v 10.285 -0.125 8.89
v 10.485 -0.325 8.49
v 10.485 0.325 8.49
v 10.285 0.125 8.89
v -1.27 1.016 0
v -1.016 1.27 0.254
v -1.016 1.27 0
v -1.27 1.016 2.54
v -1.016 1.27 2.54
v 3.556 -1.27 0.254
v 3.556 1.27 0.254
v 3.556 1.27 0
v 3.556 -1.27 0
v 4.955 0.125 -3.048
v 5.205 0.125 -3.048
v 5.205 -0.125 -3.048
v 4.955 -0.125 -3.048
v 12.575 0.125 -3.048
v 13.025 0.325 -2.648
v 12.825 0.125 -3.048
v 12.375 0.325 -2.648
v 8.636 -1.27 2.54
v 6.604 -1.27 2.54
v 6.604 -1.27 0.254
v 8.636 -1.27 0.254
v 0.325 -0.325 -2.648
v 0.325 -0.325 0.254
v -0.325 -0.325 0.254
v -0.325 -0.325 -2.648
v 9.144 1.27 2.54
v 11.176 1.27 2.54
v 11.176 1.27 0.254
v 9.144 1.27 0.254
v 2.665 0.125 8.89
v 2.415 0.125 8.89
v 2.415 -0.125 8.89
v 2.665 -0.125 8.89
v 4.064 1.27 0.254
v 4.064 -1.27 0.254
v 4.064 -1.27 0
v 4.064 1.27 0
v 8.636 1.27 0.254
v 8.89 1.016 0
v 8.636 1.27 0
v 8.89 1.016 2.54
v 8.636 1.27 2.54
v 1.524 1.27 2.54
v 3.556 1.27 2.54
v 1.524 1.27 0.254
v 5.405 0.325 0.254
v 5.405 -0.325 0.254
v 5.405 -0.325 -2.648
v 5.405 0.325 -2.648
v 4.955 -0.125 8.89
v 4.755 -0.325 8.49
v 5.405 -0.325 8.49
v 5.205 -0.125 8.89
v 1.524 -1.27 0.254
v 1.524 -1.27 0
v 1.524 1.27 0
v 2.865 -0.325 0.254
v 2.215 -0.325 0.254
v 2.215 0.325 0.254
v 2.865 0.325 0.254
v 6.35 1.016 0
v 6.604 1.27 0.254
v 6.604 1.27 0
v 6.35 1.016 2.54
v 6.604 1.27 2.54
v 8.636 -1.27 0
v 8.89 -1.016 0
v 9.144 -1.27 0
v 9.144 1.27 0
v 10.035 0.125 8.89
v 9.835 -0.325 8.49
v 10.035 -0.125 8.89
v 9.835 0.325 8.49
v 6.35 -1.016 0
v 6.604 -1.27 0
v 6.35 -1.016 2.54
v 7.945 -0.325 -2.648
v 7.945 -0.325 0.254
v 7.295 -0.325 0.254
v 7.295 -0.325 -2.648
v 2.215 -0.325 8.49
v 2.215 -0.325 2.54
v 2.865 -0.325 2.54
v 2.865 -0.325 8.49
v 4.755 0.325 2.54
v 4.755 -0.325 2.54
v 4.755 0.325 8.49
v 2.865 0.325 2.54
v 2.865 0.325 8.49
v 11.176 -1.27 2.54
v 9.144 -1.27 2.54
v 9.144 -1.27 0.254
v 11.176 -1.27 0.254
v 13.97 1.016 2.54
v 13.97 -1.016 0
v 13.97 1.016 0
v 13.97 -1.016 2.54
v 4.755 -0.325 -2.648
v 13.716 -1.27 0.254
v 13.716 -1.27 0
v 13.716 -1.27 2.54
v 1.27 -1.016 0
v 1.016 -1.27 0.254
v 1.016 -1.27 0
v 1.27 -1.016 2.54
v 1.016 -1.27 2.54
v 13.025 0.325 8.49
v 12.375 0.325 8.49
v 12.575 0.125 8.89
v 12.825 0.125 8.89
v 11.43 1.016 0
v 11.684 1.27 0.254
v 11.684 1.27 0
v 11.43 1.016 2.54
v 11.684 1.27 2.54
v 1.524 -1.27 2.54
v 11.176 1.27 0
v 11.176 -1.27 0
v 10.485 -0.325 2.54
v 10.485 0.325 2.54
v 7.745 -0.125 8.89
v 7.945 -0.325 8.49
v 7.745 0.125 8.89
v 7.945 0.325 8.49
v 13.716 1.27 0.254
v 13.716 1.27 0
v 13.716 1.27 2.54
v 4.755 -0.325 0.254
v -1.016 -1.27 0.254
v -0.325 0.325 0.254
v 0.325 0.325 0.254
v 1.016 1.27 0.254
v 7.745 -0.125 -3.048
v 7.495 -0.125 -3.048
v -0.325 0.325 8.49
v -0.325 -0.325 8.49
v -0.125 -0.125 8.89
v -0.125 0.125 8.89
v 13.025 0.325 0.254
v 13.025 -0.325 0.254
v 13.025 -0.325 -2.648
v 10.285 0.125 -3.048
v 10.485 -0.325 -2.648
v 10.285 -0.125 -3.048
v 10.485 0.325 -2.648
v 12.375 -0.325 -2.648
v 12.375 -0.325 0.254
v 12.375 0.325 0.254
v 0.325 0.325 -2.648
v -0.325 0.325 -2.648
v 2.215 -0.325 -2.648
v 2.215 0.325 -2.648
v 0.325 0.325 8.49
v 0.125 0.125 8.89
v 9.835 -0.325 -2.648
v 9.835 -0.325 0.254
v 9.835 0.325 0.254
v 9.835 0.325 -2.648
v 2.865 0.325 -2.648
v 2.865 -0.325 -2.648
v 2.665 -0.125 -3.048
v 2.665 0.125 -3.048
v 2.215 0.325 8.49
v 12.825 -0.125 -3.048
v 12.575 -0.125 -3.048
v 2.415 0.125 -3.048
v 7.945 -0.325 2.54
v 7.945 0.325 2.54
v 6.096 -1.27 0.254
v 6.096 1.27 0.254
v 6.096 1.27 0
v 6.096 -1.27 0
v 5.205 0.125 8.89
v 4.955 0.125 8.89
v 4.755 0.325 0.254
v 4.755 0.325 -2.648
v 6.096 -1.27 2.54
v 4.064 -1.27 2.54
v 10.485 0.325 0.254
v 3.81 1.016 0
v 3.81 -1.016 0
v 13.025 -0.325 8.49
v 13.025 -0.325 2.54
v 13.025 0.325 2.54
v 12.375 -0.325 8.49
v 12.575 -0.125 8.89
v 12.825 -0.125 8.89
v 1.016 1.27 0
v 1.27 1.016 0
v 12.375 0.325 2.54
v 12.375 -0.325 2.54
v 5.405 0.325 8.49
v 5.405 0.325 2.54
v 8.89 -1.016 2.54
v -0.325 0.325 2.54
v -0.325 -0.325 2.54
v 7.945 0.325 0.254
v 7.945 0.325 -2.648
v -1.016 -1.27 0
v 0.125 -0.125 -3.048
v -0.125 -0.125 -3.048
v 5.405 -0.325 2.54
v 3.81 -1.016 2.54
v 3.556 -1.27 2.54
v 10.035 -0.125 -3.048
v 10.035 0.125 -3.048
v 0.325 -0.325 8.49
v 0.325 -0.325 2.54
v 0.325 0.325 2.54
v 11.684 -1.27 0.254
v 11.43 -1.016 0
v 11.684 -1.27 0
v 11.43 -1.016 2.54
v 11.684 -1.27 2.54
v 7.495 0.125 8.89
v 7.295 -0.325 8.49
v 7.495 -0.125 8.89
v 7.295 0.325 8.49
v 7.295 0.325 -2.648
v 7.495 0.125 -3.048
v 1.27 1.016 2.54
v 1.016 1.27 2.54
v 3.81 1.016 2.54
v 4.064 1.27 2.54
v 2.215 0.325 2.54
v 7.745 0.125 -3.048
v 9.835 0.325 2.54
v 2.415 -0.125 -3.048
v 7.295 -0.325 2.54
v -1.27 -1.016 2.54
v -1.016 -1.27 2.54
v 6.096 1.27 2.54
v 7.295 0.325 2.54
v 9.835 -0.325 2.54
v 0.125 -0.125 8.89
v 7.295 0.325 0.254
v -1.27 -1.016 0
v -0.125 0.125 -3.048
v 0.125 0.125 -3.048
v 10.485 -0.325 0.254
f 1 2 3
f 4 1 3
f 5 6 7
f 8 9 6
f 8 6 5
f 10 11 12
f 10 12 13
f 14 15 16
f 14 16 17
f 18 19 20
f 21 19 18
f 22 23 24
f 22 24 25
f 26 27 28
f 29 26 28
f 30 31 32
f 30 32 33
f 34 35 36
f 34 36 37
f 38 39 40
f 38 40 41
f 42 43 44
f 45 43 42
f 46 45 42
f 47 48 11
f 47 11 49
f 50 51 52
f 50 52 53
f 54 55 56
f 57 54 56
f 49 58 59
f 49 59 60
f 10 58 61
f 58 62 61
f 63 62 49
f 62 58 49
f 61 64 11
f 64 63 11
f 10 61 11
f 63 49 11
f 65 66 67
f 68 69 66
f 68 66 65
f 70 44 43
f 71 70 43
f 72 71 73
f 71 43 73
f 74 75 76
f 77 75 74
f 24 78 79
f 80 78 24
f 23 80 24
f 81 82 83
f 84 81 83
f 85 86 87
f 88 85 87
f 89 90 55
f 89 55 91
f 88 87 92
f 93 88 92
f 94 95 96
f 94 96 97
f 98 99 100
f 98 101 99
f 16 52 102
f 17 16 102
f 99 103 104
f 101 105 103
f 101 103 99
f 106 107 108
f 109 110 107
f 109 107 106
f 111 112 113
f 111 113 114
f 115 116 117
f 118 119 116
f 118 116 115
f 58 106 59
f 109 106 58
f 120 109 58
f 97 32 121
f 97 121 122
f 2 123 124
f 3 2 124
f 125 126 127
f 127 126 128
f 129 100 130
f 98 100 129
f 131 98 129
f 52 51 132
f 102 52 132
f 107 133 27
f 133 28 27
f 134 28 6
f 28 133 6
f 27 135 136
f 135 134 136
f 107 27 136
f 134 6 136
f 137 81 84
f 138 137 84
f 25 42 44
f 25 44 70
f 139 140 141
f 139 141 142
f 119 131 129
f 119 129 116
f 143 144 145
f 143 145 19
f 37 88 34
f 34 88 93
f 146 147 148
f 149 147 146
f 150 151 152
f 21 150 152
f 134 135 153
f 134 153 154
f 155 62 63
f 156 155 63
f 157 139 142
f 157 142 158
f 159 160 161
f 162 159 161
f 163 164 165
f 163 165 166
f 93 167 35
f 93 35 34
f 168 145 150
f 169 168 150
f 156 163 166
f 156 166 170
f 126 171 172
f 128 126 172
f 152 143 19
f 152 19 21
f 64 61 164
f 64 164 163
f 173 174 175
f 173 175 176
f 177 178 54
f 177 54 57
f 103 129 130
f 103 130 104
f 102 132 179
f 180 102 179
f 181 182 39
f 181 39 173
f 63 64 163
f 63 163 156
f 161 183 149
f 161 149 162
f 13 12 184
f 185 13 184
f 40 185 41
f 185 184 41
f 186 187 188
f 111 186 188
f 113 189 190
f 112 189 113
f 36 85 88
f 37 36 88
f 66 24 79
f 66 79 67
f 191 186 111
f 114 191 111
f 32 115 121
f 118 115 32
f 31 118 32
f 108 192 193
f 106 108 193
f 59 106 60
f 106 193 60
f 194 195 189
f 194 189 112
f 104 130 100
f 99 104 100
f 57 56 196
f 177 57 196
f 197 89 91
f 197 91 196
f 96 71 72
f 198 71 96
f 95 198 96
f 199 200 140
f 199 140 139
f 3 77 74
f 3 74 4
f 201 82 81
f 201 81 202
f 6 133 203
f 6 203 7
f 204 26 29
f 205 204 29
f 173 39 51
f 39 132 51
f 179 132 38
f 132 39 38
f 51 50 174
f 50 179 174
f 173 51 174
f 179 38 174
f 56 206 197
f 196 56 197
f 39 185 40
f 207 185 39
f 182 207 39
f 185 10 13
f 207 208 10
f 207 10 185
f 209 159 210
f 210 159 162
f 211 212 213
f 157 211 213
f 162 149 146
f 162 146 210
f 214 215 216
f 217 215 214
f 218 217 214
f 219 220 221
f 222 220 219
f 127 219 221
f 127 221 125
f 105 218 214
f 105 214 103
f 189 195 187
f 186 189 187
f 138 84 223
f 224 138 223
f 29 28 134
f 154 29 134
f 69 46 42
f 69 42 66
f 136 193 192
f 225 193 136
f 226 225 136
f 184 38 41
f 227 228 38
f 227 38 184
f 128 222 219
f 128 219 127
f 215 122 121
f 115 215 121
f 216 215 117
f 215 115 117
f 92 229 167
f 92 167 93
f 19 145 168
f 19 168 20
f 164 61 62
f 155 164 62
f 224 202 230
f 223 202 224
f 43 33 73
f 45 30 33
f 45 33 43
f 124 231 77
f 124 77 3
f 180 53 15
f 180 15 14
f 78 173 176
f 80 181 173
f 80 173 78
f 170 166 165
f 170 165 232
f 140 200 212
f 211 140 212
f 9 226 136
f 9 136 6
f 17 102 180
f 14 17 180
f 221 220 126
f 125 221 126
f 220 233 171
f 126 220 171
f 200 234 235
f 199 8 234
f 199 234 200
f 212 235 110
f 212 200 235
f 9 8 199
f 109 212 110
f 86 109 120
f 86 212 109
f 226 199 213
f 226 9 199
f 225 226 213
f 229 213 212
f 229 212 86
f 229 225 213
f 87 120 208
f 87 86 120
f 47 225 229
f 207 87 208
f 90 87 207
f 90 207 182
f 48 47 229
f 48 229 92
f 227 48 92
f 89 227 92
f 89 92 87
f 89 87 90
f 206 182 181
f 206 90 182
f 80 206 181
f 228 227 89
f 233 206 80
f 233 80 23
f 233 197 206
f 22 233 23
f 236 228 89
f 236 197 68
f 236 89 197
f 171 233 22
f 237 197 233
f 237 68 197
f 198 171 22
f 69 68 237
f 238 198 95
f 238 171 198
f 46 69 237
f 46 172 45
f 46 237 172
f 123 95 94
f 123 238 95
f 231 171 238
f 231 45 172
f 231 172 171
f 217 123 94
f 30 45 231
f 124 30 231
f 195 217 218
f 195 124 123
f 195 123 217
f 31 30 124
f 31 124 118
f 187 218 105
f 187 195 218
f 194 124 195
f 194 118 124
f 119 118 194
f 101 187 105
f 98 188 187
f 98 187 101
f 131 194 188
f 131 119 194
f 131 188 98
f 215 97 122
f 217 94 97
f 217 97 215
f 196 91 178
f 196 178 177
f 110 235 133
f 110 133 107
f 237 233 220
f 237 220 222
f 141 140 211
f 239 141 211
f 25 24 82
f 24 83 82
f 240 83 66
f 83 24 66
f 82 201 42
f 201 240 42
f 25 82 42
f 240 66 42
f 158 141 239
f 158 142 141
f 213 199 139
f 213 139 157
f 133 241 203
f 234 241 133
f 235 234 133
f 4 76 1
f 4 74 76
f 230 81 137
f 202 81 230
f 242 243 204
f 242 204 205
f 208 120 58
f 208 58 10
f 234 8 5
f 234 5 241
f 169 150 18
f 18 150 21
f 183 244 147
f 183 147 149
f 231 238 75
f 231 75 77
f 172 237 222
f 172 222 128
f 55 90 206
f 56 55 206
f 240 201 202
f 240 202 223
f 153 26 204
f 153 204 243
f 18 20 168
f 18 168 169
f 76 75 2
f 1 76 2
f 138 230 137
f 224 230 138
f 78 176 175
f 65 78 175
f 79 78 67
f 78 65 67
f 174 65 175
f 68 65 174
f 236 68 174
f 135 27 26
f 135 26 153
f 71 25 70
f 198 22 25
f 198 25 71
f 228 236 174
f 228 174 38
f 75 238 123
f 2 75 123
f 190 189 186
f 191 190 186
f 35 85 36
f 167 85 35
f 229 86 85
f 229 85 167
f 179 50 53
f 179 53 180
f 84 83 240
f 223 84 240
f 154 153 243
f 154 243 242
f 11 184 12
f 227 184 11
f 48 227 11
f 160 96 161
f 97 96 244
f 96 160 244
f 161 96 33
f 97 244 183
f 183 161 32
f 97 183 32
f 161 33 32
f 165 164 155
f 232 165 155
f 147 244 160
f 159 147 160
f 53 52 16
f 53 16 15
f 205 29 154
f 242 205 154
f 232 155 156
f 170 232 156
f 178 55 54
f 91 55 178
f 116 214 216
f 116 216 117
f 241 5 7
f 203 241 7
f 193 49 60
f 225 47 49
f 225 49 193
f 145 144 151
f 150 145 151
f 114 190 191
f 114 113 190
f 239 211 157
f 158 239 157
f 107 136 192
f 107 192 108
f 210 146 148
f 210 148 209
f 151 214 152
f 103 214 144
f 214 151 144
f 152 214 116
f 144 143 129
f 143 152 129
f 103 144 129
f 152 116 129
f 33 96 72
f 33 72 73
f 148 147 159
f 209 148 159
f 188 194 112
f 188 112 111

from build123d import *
from OCP.BRepFilletAPI import BRepFilletAPI_MakeChamfer

# Parameters (mm, degrees)
BOSS_EXTRUDE1_DEPTH  = 2.286
BOSS_EXTRUDE2_DEPTH  = 0.254
BOSS_EXTRUDE3_DEPTH  = 0.254
BOSS_EXTRUDE4_DEPTH  = 0.254
BOSS_EXTRUDE5_DEPTH  = 0.254
BOSS_EXTRUDE6_DEPTH  = 0.254
BOSS_EXTRUDE7_DEPTH  = 0.254
BOSS_EXTRUDE8_DEPTH  = 0.254
SKETCH9_W            = 0.65
SKETCH9_H            = 0.65
BOSS_EXTRUDE9_DEPTH  = 3.302
SKETCH10_W           = 0.65
SKETCH10_H           = 0.65
BOSS_EXTRUDE10_DEPTH = 6.35
SKETCH11_W           = 0.65
SKETCH11_H           = 0.65
BOSS_EXTRUDE11_DEPTH = 3.302
SKETCH12_W           = 0.65
SKETCH12_H           = 0.65
BOSS_EXTRUDE12_DEPTH = 6.35
SKETCH13_W           = 0.65
SKETCH13_H           = 0.65
BOSS_EXTRUDE13_DEPTH = 3.302
SKETCH14_W           = 0.65
SKETCH14_H           = 0.65
BOSS_EXTRUDE14_DEPTH = 6.35
SKETCH15_W           = 0.65
SKETCH15_H           = 0.65
BOSS_EXTRUDE15_DEPTH = 3.302
SKETCH16_W           = 0.65
SKETCH16_H           = 0.65
BOSS_EXTRUDE16_DEPTH = 6.35
SKETCH17_W           = 0.65
SKETCH17_H           = 0.65
BOSS_EXTRUDE17_DEPTH = 3.302
SKETCH18_W           = 0.65
SKETCH18_H           = 0.65
BOSS_EXTRUDE18_DEPTH = 6.35
SKETCH19_W           = 0.65
SKETCH19_H           = 0.65
BOSS_EXTRUDE19_DEPTH = 3.302
SKETCH20_W           = 0.65
SKETCH20_H           = 0.65
BOSS_EXTRUDE20_DEPTH = 6.35
CHAMFER1_SIZE        = 0.2
CHAMFER1_SIZE2       = 0.4


with BuildPart() as part:
    # Sketch1 → Boss-Extrude1 (new body)
    with BuildSketch(Plane.XY.offset(2.54)):
        Polygon((13.97, -1.016), (13.97, 1.016), (13.716, 1.27), (11.684, 1.27), (11.43, 1.016), (11.176, 1.27), (9.144, 1.27), (8.89, 1.016), (8.636, 1.27), (6.604, 1.27), (6.35, 1.016), (6.096, 1.27), (4.064, 1.27), (3.81, 1.016), (3.556, 1.27), (1.524, 1.27), (1.27, 1.016), (1.016, 1.27), (-1.016, 1.27), (-1.27, 1.016), (-1.27, -1.016), (-1.016, -1.27), (1.016, -1.27), (1.27, -1.016), (1.524, -1.27), (3.556, -1.27), (3.81, -1.016), (4.064, -1.27), (6.096, -1.27), (6.35, -1.016), (6.604, -1.27), (8.636, -1.27), (8.89, -1.016), (9.144, -1.27), (11.176, -1.27), (11.43, -1.016), (11.684, -1.27), (13.716, -1.27), align=None)
    extrude(amount=-BOSS_EXTRUDE1_DEPTH)

    # Sketch2 → Boss-Extrude2 (add)
    with BuildSketch(Plane(origin=(0, 0, 0.254), x_dir=(-1, 0, 0), z_dir=(0, 0, -1))):
        Polygon((-6.604, -1.27), (-6.604, 1.27), (-6.35, 1.016), (-6.096, 1.27), (-6.096, -1.27), (-6.35, -1.016), align=None)
    extrude(amount=BOSS_EXTRUDE2_DEPTH)

    # Sketch3 → Boss-Extrude3 (add)
    with BuildSketch(Plane(origin=(0, 0, 0.254), x_dir=(-1, 0, 0), z_dir=(0, 0, -1))):
        Polygon((-9.144, -1.27), (-9.144, 1.27), (-8.89, 1.016), (-8.636, 1.27), (-8.636, -1.27), (-8.89, -1.016), align=None)
    extrude(amount=BOSS_EXTRUDE3_DEPTH)

    # Sketch4 → Boss-Extrude4 (add)
    with BuildSketch(Plane(origin=(0, 0, 0.254), x_dir=(-1, 0, 0), z_dir=(0, 0, -1))):
        Polygon((-11.684, -1.27), (-11.684, 1.27), (-11.43, 1.016), (-11.176, 1.27), (-11.176, -1.27), (-11.43, -1.016), align=None)
    extrude(amount=BOSS_EXTRUDE4_DEPTH)

    # Sketch5 → Boss-Extrude5 (add)
    with BuildSketch(Plane(origin=(0, 0, 0.254), x_dir=(-1, 0, 0), z_dir=(0, 0, -1))):
        Polygon((-4.064, -1.27), (-4.064, 1.27), (-3.81, 1.016), (-3.556, 1.27), (-3.556, -1.27), (-3.81, -1.016), align=None)
    extrude(amount=BOSS_EXTRUDE5_DEPTH)

    # Sketch6 → Boss-Extrude6 (add)
    with BuildSketch(Plane(origin=(0, 0, 0.254), x_dir=(-1, 0, 0), z_dir=(0, 0, -1))):
        Polygon((-1.524, -1.27), (-1.524, 1.27), (-1.27, 1.016), (-1.016, 1.27), (-1.016, -1.27), (-1.27, -1.016), align=None)
    extrude(amount=BOSS_EXTRUDE6_DEPTH)

    # Sketch7 → Boss-Extrude7 (add)
    with BuildSketch(Plane(origin=(0, 0, 0.254), x_dir=(-1, 0, 0), z_dir=(0, 0, -1))):
        Polygon((1.016, -1.27), (1.016, 1.27), (1.27, 1.016), (1.27, -1.016), align=None)
    extrude(amount=BOSS_EXTRUDE7_DEPTH)

    # Sketch8 → Boss-Extrude8 (add)
    with BuildSketch(Plane(origin=(0, 0, 0.254), x_dir=(-1, 0, 0), z_dir=(0, 0, -1))):
        Polygon((-13.97, -1.016), (-13.97, 1.016), (-13.716, 1.27), (-13.716, -1.27), align=None)
    extrude(amount=BOSS_EXTRUDE8_DEPTH)

    # Sketch9 → Boss-Extrude9 (add)
    with BuildSketch(Plane(origin=(0, 0, 0.254), x_dir=(-1, 0, 0), z_dir=(0, 0, -1))):
        Rectangle(SKETCH9_W, SKETCH9_H)
    extrude(amount=BOSS_EXTRUDE9_DEPTH)

    # Sketch10 → Boss-Extrude10 (add)
    with BuildSketch(Plane.XY.offset(2.54)):
        Rectangle(SKETCH10_W, SKETCH10_H)
    extrude(amount=BOSS_EXTRUDE10_DEPTH)

    # Sketch11 → Boss-Extrude11 (add)
    with BuildSketch(Plane(origin=(0, 0, 0.254), x_dir=(-1, 0, 0), z_dir=(0, 0, -1))):
        with Locations((-12.7, 0)):
            Rectangle(SKETCH11_W, SKETCH11_H)
    extrude(amount=BOSS_EXTRUDE11_DEPTH)

    # Sketch12 → Boss-Extrude12 (add)
    with BuildSketch(Plane.XY.offset(2.54)):
        with Locations((12.7, 0)):
            Rectangle(SKETCH12_W, SKETCH12_H)
    extrude(amount=BOSS_EXTRUDE12_DEPTH)

    # Sketch13 → Boss-Extrude13 (add)
    with BuildSketch(Plane(origin=(0, 0, 0.254), x_dir=(-1, 0, 0), z_dir=(0, 0, -1))):
        with Locations((-10.16, 0)):
            Rectangle(SKETCH13_W, SKETCH13_H)
    extrude(amount=BOSS_EXTRUDE13_DEPTH)

    # Sketch14 → Boss-Extrude14 (add)
    with BuildSketch(Plane.XY.offset(2.54)):
        with Locations((10.16, 0)):
            Rectangle(SKETCH14_W, SKETCH14_H)
    extrude(amount=BOSS_EXTRUDE14_DEPTH)

    # Sketch15 → Boss-Extrude15 (add)
    with BuildSketch(Plane(origin=(0, 0, 0.254), x_dir=(-1, 0, 0), z_dir=(0, 0, -1))):
        with Locations((-7.62, 0)):
            Rectangle(SKETCH15_W, SKETCH15_H)
    extrude(amount=BOSS_EXTRUDE15_DEPTH)

    # Sketch16 → Boss-Extrude16 (add)
    with BuildSketch(Plane.XY.offset(2.54)):
        with Locations((7.62, 0)):
            Rectangle(SKETCH16_W, SKETCH16_H)
    extrude(amount=BOSS_EXTRUDE16_DEPTH)

    # Sketch17 → Boss-Extrude17 (add)
    with BuildSketch(Plane(origin=(0, 0, 0.254), x_dir=(-1, 0, 0), z_dir=(0, 0, -1))):
        with Locations((-5.08, 0)):
            Rectangle(SKETCH17_W, SKETCH17_H)
    extrude(amount=BOSS_EXTRUDE17_DEPTH)

    # Sketch18 → Boss-Extrude18 (add)
    with BuildSketch(Plane.XY.offset(2.54)):
        with Locations((5.08, 0)):
            Rectangle(SKETCH18_W, SKETCH18_H)
    extrude(amount=BOSS_EXTRUDE18_DEPTH)

    # Sketch19 → Boss-Extrude19 (add)
    with BuildSketch(Plane(origin=(0, 0, 0.254), x_dir=(-1, 0, 0), z_dir=(0, 0, -1))):
        with Locations((-2.54, 0)):
            Rectangle(SKETCH19_W, SKETCH19_H)
    extrude(amount=BOSS_EXTRUDE19_DEPTH)

    # Sketch20 → Boss-Extrude20 (add)
    with BuildSketch(Plane.XY.offset(2.54)):
        with Locations((2.54, 0)):
            Rectangle(SKETCH20_W, SKETCH20_H)
    extrude(amount=BOSS_EXTRUDE20_DEPTH)

    # Chamfer1: one chamfer whose edges measure the first distance from different faces: ONE call of the kernel's chamfer builder (chamfer() names one face for all edges)
    chamfer1_edges_1 = [part.edges().sort_by_distance(p)[0] for p in [
        (0, 0.325, -3.048),
        (0.325, 0, -3.048),
        (0, -0.325, -3.048),
        (-0.325, 0, -3.048),
    ]]
    chamfer1_side_1 = [part.faces().sort_by_distance(p)[0] for p in [
        (0, 0, -3.048),
    ]]
    chamfer1_edges_2 = [part.edges().sort_by_distance(p)[0] for p in [
        (0, -0.325, 8.89),
        (0.325, 0, 8.89),
        (0, 0.325, 8.89),
        (-0.325, 0, 8.89),
    ]]
    chamfer1_side_2 = [part.faces().sort_by_distance(p)[0] for p in [
        (0, 0, 8.89),
    ]]
    chamfer1_edges_3 = [part.edges().sort_by_distance(p)[0] for p in [
        (12.375, 0, -3.048),
        (12.7, 0.325, -3.048),
        (13.025, 0, -3.048),
        (12.7, -0.325, -3.048),
    ]]
    chamfer1_side_3 = [part.faces().sort_by_distance(p)[0] for p in [
        (12.7, 0, -3.048),
    ]]
    chamfer1_edges_4 = [part.edges().sort_by_distance(p)[0] for p in [
        (12.7, -0.325, 8.89),
        (13.025, 0, 8.89),
        (12.7, 0.325, 8.89),
        (12.375, 0, 8.89),
    ]]
    chamfer1_side_4 = [part.faces().sort_by_distance(p)[0] for p in [
        (12.7, 0, 8.89),
    ]]
    chamfer1_edges_5 = [part.edges().sort_by_distance(p)[0] for p in [
        (9.835, 0, -3.048),
        (10.16, 0.325, -3.048),
        (10.485, 0, -3.048),
        (10.16, -0.325, -3.048),
    ]]
    chamfer1_side_5 = [part.faces().sort_by_distance(p)[0] for p in [
        (10.16, 0, -3.048),
    ]]
    chamfer1_edges_6 = [part.edges().sort_by_distance(p)[0] for p in [
        (10.16, -0.325, 8.89),
        (10.485, 0, 8.89),
        (10.16, 0.325, 8.89),
        (9.835, 0, 8.89),
    ]]
    chamfer1_side_6 = [part.faces().sort_by_distance(p)[0] for p in [
        (10.16, 0, 8.89),
    ]]
    chamfer1_edges_7 = [part.edges().sort_by_distance(p)[0] for p in [
        (7.945, 0, -3.048),
        (7.62, -0.325, -3.048),
        (7.295, 0, -3.048),
        (7.62, 0.325, -3.048),
    ]]
    chamfer1_side_7 = [part.faces().sort_by_distance(p)[0] for p in [
        (7.62, 0, -3.048),
    ]]
    chamfer1_edges_8 = [part.edges().sort_by_distance(p)[0] for p in [
        (7.62, 0.325, 8.89),
        (7.295, 0, 8.89),
        (7.62, -0.325, 8.89),
        (7.945, 0, 8.89),
    ]]
    chamfer1_side_8 = [part.faces().sort_by_distance(p)[0] for p in [
        (7.62, 0, 8.89),
    ]]
    chamfer1_edges_9 = [part.edges().sort_by_distance(p)[0] for p in [
        (5.405, 0, -3.048),
        (5.08, -0.325, -3.048),
        (4.755, 0, -3.048),
        (5.08, 0.325, -3.048),
    ]]
    chamfer1_side_9 = [part.faces().sort_by_distance(p)[0] for p in [
        (5.08, 0, -3.048),
    ]]
    chamfer1_edges_10 = [part.edges().sort_by_distance(p)[0] for p in [
        (5.08, 0.325, 8.89),
        (4.755, 0, 8.89),
        (5.08, -0.325, 8.89),
        (5.405, 0, 8.89),
    ]]
    chamfer1_side_10 = [part.faces().sort_by_distance(p)[0] for p in [
        (5.08, 0, 8.89),
    ]]
    chamfer1_edges_11 = [part.edges().sort_by_distance(p)[0] for p in [
        (2.865, 0, -3.048),
        (2.54, -0.325, -3.048),
        (2.215, 0, -3.048),
        (2.54, 0.325, -3.048),
    ]]
    chamfer1_side_11 = [part.faces().sort_by_distance(p)[0] for p in [
        (2.54, 0, -3.048),
    ]]
    chamfer1_edges_12 = [part.edges().sort_by_distance(p)[0] for p in [
        (2.54, 0.325, 8.89),
        (2.215, 0, 8.89),
        (2.54, -0.325, 8.89),
        (2.865, 0, 8.89),
    ]]
    chamfer1_side_12 = [part.faces().sort_by_distance(p)[0] for p in [
        (2.54, 0, 8.89),
    ]]
    chamfer1 = BRepFilletAPI_MakeChamfer(part.part.solid().wrapped)
    for e in chamfer1_edges_1:
        chamfer1.Add(CHAMFER1_SIZE, CHAMFER1_SIZE2, e.wrapped, chamfer1_side_1[0].wrapped)  # the first distance lies on this face
    for e in chamfer1_edges_2:
        chamfer1.Add(CHAMFER1_SIZE, CHAMFER1_SIZE2, e.wrapped, chamfer1_side_2[0].wrapped)  # the first distance lies on this face
    for e in chamfer1_edges_3:
        chamfer1.Add(CHAMFER1_SIZE, CHAMFER1_SIZE2, e.wrapped, chamfer1_side_3[0].wrapped)  # the first distance lies on this face
    for e in chamfer1_edges_4:
        chamfer1.Add(CHAMFER1_SIZE, CHAMFER1_SIZE2, e.wrapped, chamfer1_side_4[0].wrapped)  # the first distance lies on this face
    for e in chamfer1_edges_5:
        chamfer1.Add(CHAMFER1_SIZE, CHAMFER1_SIZE2, e.wrapped, chamfer1_side_5[0].wrapped)  # the first distance lies on this face
    for e in chamfer1_edges_6:
        chamfer1.Add(CHAMFER1_SIZE, CHAMFER1_SIZE2, e.wrapped, chamfer1_side_6[0].wrapped)  # the first distance lies on this face
    for e in chamfer1_edges_7:
        chamfer1.Add(CHAMFER1_SIZE, CHAMFER1_SIZE2, e.wrapped, chamfer1_side_7[0].wrapped)  # the first distance lies on this face
    for e in chamfer1_edges_8:
        chamfer1.Add(CHAMFER1_SIZE, CHAMFER1_SIZE2, e.wrapped, chamfer1_side_8[0].wrapped)  # the first distance lies on this face
    for e in chamfer1_edges_9:
        chamfer1.Add(CHAMFER1_SIZE, CHAMFER1_SIZE2, e.wrapped, chamfer1_side_9[0].wrapped)  # the first distance lies on this face
    for e in chamfer1_edges_10:
        chamfer1.Add(CHAMFER1_SIZE, CHAMFER1_SIZE2, e.wrapped, chamfer1_side_10[0].wrapped)  # the first distance lies on this face
    for e in chamfer1_edges_11:
        chamfer1.Add(CHAMFER1_SIZE, CHAMFER1_SIZE2, e.wrapped, chamfer1_side_11[0].wrapped)  # the first distance lies on this face
    for e in chamfer1_edges_12:
        chamfer1.Add(CHAMFER1_SIZE, CHAMFER1_SIZE2, e.wrapped, chamfer1_side_12[0].wrapped)  # the first distance lies on this face
    add(Compound.cast(chamfer1.Shape()), mode=Mode.REPLACE)


solid = part.part
